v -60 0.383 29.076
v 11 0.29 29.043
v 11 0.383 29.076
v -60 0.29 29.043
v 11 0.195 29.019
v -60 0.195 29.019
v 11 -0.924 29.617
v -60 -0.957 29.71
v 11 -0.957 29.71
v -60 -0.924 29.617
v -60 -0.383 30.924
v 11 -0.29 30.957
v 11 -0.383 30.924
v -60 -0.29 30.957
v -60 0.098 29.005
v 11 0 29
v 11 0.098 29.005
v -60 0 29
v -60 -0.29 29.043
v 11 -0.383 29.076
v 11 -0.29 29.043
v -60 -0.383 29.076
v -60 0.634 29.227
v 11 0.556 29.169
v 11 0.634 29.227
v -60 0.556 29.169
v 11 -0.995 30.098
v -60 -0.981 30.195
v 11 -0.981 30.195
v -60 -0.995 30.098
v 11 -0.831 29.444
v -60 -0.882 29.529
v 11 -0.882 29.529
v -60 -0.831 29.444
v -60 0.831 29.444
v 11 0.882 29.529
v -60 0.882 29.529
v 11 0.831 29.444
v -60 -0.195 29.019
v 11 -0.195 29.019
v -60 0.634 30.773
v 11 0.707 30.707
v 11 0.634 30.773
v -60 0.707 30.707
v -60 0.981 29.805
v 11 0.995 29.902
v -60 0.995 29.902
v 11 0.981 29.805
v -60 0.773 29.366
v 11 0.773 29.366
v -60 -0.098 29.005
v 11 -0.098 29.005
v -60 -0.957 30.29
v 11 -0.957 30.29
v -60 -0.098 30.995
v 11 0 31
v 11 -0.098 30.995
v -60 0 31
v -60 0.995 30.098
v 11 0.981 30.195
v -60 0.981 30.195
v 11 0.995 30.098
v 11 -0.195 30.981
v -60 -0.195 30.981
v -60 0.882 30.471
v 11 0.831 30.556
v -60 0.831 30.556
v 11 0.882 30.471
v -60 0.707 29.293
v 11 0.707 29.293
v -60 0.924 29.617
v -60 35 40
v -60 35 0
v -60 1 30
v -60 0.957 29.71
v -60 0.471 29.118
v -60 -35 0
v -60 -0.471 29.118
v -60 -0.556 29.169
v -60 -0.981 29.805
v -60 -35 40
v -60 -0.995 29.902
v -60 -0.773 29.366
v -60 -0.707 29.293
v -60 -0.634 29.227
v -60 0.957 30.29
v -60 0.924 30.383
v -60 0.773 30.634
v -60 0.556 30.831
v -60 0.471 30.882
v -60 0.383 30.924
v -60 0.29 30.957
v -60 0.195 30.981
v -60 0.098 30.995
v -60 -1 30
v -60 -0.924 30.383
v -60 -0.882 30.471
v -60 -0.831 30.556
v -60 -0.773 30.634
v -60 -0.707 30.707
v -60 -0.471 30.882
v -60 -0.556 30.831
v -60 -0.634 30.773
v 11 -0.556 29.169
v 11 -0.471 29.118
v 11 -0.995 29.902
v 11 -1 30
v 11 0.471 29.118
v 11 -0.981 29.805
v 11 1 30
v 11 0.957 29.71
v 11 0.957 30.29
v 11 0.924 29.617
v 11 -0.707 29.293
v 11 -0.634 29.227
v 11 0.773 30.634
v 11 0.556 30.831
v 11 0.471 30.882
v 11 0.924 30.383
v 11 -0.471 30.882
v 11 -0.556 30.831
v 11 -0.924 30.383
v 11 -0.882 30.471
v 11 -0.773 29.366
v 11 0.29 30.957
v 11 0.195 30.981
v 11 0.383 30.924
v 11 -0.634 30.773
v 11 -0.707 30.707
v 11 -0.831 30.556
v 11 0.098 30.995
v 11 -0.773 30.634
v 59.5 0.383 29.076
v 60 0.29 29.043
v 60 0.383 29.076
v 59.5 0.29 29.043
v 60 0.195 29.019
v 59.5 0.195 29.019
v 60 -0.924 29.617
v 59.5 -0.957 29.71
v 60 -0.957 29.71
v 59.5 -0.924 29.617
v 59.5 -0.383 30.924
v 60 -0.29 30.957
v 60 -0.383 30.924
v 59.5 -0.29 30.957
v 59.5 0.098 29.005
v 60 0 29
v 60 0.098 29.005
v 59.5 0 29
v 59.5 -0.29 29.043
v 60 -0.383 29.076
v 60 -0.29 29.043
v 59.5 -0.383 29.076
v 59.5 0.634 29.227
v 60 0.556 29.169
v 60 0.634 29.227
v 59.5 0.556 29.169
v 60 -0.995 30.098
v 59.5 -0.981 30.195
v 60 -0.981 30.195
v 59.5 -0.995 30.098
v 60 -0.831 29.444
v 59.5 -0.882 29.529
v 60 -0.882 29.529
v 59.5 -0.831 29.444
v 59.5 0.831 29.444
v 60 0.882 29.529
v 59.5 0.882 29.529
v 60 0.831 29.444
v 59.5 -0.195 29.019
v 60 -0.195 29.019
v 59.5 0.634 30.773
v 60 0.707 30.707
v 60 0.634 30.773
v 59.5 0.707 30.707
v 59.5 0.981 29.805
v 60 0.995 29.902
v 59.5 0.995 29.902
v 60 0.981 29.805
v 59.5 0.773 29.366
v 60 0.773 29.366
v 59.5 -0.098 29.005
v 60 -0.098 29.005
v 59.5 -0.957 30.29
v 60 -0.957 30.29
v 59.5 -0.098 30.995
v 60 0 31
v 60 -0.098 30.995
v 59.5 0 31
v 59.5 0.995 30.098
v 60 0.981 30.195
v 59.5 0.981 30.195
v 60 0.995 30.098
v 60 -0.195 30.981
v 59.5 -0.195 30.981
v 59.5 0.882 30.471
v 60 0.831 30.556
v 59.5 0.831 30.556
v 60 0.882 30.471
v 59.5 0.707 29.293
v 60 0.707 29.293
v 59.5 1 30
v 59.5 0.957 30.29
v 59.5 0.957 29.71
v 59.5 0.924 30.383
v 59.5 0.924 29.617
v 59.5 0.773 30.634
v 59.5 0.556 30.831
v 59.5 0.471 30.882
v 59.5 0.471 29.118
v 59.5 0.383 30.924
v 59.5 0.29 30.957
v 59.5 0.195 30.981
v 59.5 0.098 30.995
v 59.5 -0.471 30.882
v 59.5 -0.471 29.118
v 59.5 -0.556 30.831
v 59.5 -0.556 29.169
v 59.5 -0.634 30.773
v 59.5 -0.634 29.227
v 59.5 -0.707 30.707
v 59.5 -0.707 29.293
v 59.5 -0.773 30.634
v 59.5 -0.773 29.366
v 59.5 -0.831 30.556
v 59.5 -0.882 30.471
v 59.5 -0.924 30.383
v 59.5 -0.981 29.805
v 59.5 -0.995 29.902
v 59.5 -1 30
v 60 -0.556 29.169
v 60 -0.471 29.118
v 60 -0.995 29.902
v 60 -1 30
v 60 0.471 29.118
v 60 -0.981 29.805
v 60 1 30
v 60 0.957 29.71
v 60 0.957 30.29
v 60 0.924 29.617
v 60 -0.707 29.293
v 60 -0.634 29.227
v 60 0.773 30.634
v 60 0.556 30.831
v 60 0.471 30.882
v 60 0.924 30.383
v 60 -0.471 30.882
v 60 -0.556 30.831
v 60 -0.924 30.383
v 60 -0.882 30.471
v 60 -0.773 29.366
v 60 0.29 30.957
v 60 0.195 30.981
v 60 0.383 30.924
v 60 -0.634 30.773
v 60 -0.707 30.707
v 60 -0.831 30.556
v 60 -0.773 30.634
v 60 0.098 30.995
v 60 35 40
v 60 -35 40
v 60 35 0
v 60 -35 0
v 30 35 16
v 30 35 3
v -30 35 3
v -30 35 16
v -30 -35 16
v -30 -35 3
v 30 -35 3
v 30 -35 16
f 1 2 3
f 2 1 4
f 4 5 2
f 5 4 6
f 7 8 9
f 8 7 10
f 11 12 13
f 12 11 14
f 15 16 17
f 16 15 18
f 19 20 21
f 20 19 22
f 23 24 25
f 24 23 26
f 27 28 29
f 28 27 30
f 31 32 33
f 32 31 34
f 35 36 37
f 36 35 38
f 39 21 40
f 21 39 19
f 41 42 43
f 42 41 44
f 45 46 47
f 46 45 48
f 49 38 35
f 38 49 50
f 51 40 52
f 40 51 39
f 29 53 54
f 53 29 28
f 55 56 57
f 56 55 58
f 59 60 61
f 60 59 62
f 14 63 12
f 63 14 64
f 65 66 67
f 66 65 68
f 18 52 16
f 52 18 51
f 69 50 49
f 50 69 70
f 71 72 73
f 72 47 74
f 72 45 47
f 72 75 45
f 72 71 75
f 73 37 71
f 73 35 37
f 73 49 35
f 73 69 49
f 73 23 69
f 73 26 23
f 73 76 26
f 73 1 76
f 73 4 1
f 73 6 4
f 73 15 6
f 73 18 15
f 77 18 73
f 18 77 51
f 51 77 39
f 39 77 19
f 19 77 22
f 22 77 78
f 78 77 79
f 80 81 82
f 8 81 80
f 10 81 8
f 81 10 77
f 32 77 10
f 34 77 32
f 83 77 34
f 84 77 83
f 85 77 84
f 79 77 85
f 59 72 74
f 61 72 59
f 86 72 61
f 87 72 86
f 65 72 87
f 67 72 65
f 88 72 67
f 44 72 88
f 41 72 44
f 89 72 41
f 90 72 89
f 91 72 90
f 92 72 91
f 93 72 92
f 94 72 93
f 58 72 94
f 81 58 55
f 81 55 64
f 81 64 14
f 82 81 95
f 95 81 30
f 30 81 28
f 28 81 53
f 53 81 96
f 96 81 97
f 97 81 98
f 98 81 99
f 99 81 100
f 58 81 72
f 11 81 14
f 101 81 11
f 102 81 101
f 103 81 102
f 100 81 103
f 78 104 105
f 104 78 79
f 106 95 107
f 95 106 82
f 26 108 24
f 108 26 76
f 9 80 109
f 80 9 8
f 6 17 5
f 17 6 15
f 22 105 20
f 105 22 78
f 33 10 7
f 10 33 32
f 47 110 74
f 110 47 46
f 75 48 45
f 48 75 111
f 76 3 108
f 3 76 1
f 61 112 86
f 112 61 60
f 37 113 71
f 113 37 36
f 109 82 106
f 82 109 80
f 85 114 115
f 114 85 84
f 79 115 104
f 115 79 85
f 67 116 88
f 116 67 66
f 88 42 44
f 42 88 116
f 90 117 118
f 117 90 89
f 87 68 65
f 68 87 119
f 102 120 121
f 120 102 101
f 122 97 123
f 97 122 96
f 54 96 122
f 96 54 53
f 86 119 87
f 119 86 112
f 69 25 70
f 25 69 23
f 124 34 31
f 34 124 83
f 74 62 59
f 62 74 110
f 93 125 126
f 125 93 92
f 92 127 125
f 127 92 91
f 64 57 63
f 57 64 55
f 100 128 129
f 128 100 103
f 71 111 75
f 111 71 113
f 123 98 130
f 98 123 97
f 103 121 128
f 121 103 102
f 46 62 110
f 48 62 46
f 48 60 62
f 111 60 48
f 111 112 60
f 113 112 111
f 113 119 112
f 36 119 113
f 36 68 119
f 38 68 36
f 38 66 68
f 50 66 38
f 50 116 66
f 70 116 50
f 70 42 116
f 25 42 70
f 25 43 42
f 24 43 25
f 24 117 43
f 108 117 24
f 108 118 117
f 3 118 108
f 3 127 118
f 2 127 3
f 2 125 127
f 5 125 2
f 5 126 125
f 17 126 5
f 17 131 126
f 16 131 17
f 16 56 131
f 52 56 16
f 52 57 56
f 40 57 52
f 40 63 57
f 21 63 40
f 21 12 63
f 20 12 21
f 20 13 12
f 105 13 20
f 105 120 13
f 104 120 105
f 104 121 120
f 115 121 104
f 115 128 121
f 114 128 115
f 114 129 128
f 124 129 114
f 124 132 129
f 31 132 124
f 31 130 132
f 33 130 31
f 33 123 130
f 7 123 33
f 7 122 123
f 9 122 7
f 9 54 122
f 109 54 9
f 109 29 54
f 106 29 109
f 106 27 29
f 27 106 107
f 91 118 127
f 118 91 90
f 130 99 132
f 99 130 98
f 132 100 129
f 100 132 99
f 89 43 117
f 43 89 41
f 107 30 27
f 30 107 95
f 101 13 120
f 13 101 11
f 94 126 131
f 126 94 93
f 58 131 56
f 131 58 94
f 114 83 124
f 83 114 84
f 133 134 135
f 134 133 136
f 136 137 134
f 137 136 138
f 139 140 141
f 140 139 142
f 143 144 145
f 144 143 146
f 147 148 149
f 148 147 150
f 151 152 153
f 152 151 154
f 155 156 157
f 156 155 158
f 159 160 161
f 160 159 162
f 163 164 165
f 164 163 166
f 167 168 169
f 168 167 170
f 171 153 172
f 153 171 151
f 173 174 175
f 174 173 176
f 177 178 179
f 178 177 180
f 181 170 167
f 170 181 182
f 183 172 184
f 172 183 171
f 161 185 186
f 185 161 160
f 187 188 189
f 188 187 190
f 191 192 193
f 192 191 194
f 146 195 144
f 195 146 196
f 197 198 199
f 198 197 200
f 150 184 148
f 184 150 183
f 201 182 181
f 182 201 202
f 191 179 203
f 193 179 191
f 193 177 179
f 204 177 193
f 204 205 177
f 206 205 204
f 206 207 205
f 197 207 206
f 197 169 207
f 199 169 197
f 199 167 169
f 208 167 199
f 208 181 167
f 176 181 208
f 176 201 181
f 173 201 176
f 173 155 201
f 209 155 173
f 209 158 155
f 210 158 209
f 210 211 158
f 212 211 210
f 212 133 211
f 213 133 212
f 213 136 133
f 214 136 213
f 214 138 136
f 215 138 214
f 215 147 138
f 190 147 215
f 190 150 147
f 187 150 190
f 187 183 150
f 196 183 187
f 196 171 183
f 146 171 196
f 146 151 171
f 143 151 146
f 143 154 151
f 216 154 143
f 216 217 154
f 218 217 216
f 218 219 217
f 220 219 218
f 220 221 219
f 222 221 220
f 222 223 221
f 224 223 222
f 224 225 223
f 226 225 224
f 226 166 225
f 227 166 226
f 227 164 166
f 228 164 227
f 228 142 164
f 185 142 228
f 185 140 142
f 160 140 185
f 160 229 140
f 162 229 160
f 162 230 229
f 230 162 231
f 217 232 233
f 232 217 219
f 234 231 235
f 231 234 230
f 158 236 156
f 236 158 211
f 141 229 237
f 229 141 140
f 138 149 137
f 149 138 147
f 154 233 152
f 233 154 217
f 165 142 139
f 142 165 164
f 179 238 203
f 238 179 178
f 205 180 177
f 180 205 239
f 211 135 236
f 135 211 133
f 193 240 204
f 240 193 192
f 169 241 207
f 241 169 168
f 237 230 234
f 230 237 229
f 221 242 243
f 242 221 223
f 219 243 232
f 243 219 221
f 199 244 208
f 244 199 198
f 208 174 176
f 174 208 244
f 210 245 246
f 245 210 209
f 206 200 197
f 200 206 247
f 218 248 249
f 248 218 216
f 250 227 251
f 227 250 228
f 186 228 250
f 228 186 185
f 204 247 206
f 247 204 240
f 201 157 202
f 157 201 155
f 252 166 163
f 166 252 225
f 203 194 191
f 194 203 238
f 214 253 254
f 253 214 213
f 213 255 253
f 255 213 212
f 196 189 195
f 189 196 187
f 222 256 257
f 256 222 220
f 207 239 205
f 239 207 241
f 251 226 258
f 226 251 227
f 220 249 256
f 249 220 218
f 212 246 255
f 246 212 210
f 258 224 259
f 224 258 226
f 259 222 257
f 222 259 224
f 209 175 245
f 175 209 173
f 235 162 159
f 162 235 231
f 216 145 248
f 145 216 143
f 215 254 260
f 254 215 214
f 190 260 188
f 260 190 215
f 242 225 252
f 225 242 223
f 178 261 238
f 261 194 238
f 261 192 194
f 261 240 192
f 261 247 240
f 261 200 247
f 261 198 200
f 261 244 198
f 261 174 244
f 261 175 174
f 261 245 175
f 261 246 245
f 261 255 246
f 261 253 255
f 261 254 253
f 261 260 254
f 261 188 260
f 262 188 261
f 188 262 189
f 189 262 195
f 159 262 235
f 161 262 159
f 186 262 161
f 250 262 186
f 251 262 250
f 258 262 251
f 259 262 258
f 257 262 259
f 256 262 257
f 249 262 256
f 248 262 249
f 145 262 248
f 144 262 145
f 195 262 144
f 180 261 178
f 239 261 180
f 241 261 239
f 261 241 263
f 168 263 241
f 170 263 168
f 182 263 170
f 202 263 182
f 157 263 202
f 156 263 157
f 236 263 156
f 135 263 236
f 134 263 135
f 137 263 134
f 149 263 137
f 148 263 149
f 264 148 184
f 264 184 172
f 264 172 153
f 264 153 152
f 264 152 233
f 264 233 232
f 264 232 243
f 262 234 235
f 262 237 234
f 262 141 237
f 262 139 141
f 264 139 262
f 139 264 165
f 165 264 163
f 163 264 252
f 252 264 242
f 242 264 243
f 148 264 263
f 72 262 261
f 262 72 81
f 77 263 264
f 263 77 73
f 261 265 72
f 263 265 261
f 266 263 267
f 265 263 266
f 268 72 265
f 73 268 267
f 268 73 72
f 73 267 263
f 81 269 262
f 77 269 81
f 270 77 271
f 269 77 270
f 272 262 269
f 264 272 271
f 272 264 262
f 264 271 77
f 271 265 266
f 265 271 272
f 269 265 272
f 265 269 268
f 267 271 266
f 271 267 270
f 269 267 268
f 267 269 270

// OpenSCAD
// Mini horizontal gel-electrophoresis buffer tank
// Print orientation: base on XY plane, open top at z = 40

// ---- Tank dimensions ----
outer_x = 120;   // outer length along X
outer_y = 70;    // outer width along Y
height  = 40;    // overall height along Z
wall    = 3;     // wall thickness
floor   = 3;     // floor thickness

// ---- Platform dimensions ----
plat_len   = 60;  // platform length along X
plat_top_z = 13;  // platform top height (10 mm above inner floor)

// ---- Wire holes ----
hole_d = 2;       // hole diameter
hole_y = 0;       // hole Y position
hole_z = 30;      // hole Z position

// ---- Derived ----
inner_x = outer_x - 2 * wall;   // 114
inner_z = height - floor;       // 37
overlap = 0.5;                  // for clean boolean cuts

$fn = 64;

difference() {
    // Main tank body (solid, no internal model needed)
    translate([-outer_x / 2, -outer_y / 2, 0])
        cube([outer_x, outer_y, height]);

    // Raised platform in the middle
    translate([-plat_len / 2, -outer_y / 2, floor])
        cube([plat_len, outer_y, plat_top_z]);

    // Horizontal wire holes through each end wall along X
    for (sx = [-1, 1])
        translate([sx > 0 ? outer_x / 2 - overlap : -outer_x / 2, hole_y, hole_z])
            rotate([0, 90, 0])
                cylinder(d = hole_d, h = outer_y + 2 * overlap);
}
